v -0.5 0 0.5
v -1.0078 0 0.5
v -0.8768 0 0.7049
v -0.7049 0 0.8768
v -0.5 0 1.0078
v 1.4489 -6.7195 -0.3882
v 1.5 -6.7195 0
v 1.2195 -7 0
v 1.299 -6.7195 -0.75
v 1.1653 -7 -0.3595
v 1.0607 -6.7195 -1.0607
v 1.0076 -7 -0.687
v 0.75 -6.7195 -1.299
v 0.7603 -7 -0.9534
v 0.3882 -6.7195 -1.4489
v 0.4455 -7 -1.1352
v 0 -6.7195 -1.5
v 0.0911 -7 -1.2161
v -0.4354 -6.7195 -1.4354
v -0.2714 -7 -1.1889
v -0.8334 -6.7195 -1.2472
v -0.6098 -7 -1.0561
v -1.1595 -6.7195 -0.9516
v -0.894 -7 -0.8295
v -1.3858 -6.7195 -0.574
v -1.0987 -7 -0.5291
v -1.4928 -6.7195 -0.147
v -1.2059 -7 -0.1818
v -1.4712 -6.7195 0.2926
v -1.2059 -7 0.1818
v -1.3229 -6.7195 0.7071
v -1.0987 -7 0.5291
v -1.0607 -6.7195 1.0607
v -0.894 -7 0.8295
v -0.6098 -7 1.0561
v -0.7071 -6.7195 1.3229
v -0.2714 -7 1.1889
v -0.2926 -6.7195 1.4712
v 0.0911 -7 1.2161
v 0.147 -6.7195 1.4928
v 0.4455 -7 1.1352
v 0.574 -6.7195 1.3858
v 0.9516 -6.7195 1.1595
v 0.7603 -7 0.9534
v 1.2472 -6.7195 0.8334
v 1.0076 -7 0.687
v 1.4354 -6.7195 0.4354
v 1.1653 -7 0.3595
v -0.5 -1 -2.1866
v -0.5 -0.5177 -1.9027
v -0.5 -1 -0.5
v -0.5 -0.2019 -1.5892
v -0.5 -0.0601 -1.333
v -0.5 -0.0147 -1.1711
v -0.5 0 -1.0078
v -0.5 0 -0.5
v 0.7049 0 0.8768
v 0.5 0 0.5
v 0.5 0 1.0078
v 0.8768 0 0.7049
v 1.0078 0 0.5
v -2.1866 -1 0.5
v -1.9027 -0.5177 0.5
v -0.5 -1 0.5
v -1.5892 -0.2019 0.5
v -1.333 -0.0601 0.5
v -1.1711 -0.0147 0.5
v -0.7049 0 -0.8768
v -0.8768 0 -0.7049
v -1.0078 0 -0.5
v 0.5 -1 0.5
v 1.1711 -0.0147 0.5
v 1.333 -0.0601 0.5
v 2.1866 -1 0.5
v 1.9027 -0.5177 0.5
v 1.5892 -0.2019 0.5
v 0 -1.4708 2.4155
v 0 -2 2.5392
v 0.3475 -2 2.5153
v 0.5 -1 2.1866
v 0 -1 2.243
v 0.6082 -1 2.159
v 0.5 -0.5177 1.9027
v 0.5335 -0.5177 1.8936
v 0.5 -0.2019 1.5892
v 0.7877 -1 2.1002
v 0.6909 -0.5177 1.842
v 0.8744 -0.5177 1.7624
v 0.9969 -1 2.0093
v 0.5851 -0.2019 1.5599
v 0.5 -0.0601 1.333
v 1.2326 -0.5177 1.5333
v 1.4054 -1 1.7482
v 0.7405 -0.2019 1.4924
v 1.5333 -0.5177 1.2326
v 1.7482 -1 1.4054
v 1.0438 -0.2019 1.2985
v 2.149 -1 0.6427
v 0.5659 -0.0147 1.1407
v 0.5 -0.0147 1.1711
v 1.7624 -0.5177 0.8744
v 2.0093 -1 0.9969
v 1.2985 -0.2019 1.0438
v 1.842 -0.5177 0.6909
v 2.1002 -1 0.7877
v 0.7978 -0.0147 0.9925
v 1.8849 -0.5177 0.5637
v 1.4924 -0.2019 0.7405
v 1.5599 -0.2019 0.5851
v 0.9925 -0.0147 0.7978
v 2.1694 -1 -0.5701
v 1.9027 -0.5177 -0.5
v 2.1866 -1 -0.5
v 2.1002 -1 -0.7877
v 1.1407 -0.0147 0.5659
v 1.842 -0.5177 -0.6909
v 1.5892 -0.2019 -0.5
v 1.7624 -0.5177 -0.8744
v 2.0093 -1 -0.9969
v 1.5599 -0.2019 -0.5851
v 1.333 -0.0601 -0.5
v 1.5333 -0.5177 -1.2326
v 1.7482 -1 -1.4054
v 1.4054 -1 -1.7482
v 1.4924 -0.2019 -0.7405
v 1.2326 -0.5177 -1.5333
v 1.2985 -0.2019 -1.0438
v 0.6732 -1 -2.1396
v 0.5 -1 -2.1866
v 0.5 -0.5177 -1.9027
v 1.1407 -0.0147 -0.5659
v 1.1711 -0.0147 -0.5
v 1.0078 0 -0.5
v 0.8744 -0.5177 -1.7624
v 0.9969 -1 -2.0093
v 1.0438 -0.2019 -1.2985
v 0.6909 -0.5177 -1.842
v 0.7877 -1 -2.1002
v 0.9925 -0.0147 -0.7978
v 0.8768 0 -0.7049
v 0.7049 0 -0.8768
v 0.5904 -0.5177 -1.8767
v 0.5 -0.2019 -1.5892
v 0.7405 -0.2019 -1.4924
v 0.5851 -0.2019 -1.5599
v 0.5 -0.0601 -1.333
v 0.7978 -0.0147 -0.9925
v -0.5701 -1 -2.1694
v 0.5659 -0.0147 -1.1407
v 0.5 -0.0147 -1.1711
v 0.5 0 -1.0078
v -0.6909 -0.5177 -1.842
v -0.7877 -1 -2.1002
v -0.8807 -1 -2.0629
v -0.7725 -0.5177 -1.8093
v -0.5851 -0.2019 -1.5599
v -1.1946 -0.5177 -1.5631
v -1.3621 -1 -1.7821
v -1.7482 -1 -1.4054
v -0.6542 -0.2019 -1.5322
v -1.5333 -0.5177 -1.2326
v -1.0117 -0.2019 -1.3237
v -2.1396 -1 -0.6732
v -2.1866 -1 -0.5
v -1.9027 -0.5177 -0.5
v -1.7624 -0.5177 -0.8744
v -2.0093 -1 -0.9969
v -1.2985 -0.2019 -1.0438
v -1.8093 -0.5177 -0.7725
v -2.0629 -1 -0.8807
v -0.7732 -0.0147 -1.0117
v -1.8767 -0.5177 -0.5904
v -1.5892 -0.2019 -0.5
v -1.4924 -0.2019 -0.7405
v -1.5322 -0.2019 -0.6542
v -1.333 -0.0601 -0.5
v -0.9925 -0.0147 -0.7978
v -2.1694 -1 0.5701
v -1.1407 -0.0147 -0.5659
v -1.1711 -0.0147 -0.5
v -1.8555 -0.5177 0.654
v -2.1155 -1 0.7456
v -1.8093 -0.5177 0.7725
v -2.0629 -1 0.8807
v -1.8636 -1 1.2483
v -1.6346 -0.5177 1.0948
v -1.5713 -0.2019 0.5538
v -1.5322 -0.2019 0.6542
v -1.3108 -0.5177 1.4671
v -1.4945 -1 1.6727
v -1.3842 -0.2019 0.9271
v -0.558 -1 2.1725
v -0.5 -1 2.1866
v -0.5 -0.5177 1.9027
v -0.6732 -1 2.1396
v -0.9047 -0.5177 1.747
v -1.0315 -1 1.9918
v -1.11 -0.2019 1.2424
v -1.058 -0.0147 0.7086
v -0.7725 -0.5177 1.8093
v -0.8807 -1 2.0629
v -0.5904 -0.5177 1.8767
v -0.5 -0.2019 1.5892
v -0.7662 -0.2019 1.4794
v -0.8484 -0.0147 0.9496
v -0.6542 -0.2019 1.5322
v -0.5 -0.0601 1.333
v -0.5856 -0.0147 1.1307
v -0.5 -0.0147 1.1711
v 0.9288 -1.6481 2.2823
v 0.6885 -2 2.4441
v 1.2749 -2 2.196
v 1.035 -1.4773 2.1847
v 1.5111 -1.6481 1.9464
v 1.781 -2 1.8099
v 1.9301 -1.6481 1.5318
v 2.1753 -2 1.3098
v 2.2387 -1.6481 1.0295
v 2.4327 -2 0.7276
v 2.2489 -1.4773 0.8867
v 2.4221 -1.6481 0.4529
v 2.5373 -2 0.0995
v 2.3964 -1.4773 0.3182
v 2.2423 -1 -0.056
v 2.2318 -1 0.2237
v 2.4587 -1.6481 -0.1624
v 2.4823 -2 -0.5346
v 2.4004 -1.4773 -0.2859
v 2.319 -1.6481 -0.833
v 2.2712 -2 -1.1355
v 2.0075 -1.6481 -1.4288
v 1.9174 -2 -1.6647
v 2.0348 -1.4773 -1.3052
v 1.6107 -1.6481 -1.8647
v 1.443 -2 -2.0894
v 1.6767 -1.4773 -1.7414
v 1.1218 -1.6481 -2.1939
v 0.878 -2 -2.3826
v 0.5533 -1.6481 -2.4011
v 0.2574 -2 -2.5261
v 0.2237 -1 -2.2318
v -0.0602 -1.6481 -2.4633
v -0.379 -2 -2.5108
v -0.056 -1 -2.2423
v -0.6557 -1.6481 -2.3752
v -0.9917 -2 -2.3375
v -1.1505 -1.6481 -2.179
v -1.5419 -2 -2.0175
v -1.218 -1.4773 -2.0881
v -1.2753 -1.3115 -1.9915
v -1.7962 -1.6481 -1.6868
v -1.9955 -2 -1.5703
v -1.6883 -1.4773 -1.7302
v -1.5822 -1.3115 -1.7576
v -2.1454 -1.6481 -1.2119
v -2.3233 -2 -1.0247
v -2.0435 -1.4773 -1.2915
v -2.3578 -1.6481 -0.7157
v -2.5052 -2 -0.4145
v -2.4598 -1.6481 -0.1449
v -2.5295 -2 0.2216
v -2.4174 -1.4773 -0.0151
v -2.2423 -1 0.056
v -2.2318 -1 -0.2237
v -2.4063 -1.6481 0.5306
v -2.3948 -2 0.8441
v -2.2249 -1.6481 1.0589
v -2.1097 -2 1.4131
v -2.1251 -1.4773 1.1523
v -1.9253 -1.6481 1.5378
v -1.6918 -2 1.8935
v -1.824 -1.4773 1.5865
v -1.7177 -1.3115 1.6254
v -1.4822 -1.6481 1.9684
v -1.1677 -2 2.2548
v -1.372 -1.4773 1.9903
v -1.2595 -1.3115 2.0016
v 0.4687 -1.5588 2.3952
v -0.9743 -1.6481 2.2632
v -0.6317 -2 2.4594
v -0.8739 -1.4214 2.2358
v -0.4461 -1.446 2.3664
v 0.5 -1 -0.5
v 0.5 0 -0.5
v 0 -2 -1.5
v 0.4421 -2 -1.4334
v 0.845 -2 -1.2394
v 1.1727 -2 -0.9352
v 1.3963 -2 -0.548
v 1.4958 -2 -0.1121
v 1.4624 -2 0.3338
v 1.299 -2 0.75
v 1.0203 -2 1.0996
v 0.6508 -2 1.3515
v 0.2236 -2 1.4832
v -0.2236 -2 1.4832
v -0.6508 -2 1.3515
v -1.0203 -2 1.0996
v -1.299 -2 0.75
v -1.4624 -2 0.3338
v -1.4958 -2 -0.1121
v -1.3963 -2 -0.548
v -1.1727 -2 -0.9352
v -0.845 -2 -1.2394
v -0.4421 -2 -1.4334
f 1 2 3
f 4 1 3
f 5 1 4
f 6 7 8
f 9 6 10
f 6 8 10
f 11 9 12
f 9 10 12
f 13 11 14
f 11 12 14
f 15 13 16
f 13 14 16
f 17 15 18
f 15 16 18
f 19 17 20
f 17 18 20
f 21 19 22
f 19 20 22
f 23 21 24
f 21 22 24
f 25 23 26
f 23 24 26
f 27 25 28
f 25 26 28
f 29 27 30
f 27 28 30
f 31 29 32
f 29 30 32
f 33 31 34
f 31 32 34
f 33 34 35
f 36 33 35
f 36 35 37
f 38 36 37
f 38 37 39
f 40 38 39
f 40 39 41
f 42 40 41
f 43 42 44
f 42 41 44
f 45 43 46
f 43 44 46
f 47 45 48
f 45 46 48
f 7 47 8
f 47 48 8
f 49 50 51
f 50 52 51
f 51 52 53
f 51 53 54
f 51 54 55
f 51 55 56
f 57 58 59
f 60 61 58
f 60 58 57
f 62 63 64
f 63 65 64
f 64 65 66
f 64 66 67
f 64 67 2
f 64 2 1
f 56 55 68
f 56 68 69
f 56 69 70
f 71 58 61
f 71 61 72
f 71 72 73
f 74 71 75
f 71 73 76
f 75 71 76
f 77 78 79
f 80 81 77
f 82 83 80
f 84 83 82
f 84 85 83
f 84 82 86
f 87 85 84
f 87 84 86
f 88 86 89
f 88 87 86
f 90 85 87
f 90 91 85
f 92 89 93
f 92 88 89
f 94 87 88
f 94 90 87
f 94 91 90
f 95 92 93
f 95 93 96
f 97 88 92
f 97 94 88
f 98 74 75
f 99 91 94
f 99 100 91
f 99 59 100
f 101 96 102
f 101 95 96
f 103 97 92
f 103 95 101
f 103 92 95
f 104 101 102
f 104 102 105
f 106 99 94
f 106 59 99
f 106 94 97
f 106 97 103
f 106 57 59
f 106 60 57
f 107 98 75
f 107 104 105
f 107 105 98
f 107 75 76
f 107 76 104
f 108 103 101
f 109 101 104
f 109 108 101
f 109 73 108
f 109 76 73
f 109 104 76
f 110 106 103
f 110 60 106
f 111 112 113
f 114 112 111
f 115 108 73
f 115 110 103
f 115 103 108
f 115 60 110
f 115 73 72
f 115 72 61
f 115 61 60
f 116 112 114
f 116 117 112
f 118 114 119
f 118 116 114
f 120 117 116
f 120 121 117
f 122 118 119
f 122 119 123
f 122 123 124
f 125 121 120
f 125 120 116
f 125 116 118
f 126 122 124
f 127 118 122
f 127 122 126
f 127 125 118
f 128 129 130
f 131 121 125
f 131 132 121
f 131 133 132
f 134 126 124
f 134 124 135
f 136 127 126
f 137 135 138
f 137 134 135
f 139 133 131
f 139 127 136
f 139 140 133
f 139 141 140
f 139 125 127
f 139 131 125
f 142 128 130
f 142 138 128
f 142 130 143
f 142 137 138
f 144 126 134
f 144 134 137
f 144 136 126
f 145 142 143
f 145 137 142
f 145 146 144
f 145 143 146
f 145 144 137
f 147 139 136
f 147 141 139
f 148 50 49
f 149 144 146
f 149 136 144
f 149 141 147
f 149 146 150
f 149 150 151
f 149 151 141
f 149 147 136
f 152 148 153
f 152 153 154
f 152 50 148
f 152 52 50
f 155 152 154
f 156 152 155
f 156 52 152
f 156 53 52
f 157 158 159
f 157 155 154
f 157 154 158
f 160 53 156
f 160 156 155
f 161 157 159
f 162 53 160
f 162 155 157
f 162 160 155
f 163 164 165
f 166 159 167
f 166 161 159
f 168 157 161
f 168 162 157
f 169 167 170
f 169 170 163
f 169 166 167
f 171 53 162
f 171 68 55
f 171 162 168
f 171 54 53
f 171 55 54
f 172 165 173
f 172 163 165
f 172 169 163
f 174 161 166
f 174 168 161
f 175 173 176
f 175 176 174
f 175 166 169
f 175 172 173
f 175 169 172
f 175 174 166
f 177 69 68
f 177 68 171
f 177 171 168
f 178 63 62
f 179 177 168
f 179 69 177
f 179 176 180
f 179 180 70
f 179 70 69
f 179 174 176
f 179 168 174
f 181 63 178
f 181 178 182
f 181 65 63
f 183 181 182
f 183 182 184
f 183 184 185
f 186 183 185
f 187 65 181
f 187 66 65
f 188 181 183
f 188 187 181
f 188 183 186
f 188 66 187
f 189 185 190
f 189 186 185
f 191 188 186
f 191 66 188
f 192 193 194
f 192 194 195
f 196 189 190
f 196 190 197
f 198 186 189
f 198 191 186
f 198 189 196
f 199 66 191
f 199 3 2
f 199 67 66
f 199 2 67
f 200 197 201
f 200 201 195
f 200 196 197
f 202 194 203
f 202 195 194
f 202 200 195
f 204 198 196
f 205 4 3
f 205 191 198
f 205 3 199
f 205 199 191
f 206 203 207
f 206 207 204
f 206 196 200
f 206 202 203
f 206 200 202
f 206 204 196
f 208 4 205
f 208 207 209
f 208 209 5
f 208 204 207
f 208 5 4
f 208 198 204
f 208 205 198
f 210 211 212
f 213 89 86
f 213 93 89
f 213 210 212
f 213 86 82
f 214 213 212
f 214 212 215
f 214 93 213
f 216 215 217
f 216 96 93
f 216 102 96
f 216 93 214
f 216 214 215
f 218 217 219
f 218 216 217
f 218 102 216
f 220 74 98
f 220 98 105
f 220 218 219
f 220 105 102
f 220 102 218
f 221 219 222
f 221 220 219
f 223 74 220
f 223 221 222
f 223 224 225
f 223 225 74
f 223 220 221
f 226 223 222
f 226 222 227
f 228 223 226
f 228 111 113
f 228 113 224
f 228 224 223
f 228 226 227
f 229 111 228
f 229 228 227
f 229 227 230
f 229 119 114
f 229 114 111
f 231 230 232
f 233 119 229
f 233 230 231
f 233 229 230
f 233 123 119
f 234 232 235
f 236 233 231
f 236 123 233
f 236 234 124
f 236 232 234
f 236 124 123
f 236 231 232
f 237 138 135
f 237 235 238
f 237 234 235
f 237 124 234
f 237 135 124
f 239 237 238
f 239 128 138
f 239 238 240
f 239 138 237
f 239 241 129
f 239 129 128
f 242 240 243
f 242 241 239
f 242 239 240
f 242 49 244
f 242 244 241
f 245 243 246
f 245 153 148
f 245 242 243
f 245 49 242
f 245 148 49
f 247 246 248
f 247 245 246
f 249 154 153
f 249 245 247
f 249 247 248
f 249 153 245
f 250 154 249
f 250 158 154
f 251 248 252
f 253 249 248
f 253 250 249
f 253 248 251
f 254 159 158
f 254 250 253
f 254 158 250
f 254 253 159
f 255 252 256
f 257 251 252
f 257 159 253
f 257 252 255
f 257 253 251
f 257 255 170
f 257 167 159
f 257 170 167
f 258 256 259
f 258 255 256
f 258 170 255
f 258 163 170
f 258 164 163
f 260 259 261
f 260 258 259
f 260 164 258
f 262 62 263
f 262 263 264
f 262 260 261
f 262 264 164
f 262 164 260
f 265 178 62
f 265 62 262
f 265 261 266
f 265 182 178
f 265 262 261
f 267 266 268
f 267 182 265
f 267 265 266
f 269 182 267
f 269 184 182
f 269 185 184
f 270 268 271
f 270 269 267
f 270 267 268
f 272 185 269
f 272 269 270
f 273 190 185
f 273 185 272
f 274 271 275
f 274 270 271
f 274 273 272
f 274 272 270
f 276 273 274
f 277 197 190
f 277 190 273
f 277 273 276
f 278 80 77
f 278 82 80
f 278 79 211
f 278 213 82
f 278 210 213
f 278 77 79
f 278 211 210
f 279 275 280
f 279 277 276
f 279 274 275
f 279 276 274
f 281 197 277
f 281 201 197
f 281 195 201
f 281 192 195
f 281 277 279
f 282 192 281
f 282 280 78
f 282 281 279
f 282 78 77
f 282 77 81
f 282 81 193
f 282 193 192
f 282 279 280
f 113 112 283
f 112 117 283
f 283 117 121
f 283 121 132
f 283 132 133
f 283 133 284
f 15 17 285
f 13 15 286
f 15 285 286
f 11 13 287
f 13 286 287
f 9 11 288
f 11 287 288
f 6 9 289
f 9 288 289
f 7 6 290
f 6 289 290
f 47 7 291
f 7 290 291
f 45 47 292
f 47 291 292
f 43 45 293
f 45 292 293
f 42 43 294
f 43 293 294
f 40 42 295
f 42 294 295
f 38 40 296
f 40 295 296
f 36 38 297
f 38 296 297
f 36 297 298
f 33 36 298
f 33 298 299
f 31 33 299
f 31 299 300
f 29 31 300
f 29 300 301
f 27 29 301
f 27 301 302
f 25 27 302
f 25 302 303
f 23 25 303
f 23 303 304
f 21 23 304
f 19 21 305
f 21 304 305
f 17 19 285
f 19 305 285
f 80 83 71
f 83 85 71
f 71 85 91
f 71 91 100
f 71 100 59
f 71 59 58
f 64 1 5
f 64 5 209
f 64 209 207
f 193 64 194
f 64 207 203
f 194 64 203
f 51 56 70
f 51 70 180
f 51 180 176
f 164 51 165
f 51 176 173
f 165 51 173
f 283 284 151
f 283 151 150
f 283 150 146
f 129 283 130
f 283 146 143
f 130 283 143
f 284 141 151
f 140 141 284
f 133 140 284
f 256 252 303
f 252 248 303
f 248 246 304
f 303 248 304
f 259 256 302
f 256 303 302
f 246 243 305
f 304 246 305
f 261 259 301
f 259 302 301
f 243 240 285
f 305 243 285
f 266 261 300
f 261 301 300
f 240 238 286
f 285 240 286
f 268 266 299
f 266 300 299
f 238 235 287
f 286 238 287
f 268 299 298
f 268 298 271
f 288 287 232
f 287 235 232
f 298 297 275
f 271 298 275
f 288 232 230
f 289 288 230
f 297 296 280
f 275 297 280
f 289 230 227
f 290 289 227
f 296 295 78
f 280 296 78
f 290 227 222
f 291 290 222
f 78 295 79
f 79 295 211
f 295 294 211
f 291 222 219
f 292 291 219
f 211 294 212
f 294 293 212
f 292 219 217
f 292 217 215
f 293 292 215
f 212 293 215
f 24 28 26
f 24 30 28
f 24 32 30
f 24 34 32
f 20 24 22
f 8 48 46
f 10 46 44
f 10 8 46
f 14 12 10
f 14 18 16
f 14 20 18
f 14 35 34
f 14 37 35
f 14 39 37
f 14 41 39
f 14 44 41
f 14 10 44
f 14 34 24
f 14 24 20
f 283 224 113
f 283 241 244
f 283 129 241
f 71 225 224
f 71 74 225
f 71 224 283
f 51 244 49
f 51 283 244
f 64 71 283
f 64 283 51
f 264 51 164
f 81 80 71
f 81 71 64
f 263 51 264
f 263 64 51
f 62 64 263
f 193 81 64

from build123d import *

# Parameters (mm, degrees)
SKETCH1_R           = 2.625
BOSS_EXTRUDE1_DEPTH = 2
SKETCH2_R           = 1.5
BOSS_EXTRUDE2_DEPTH = 5
FILLET1_SIZE        = 3
FILLET1_SIZE_2      = 1.5
SKETCH4_W           = 1
SKETCH4_H           = 1
CUT_EXTRUDE1_DEPTH  = 1


# Read off the part's stored shape, not the designer's step: M3x0.5 Machine Threads Stud1
with BuildPart() as part:
    # Sketch1 → Boss-Extrude1 (new body)
    with BuildSketch(Plane(origin=(0, 0, 0), x_dir=(1, 0, 0), z_dir=(0, 1, 0))):
        with Locations(Location((0, 0, 0), (0, 0, 270))):
            Circle(SKETCH1_R)
    extrude(amount=-BOSS_EXTRUDE1_DEPTH)

    # Sketch2 → Boss-Extrude2 (add)
    with BuildSketch(Plane(origin=(0, -2, 0), x_dir=(-1, 0, 0), z_dir=(0, -1, 0))):
        with Locations(Location((0, 0, 0), (0, 0, 90))):
            Circle(SKETCH2_R)
    extrude(amount=BOSS_EXTRUDE2_DEPTH)

    # M3x0.5 Machine Threads Stud1 outline → M3x0.5 Machine Threads Stud1 (revolve, cut)
    with BuildSketch(Plane.XY):
        Polygon((1.5, -6.7195), (1.2195, -7), (1.5, -7), align=None)
    revolve(axis=Axis((0, 0, 0), (0, 1, 0)), mode=Mode.SUBTRACT)

    # Fillet1
    # an asymmetric fillet: 3, 1.5 mm, written as the material it takes off along each edge
    with BuildSketch(Plane(origin=(0, 0, 0), x_dir=(0, 0, 1), z_dir=(-1, 0, 0))) as fillet1_piece_1:
        with BuildLine():
            Bezier((2.625, -FILLET1_SIZE), (2.625, 0), (2.625 - FILLET1_SIZE_2, 0), weights=[1, 0.707106781, 1])
            Line((2.625 - FILLET1_SIZE_2, 0), (2.625, 0))
            Line((2.625, 0), (2.625, -FILLET1_SIZE))
        make_face()
    revolve(axis=Axis((0, 0, 0), (0, 1, 0)), mode=Mode.SUBTRACT)

    # Sketch4 → Cut-Extrude1 (cut)
    with BuildSketch(Plane(origin=(0, 0, 0), x_dir=(-1, 0, 0), z_dir=(0, 1, 0))):
        with BuildLine():
            Line((-3, 0.5), (-3, -0.5))
            Line((-3, -0.5), (-1.007782219, -0.5))
            ThreePointArc((-1.007782219, -0.5), (-1.125, 0), (-1.007782219, 0.5))
            Line((-1.007782219, 0.5), (-3, 0.5))
        make_face()
        with BuildLine():
            ThreePointArc((-1.007782219, 0.5), (-1.125, 0), (-1.007782219, -0.5))
            Line((-1.007782219, -0.5), (-0.5, -0.5))
            Line((-0.5, -0.5), (-0.5, 0.5))
            Line((-0.5, 0.5), (-1.007782219, 0.5))
        make_face()
        Rectangle(SKETCH4_W, SKETCH4_H)
        with BuildLine():
            Line((0.5, -0.5), (-0.5, -0.5))
            Line((-0.5, -0.5), (-0.5, -1.007782219))
            ThreePointArc((-0.5, -1.007782219), (0, -1.125), (0.5, -1.007782219))
            Line((0.5, -1.007782219), (0.5, -0.5))
        make_face()
        with BuildLine():
            ThreePointArc((0.5, -1.007782219), (0, -1.125), (-0.5, -1.007782219))
            Line((-0.5, -1.007782219), (-0.5, -3))
            Line((-0.5, -3), (0.5, -3))
            Line((0.5, -3), (0.5, -1.007782219))
        make_face()
        with BuildLine():
            Line((0.5, 0.5), (0.5, -0.5))
            Line((0.5, -0.5), (1.007782219, -0.5))
            ThreePointArc((1.007782219, -0.5), (1.09530361, -0.256778118), (1.125, 0))
            ThreePointArc((1.125, 0), (1.09530361, 0.256778118), (1.007782219, 0.5))
            Line((1.007782219, 0.5), (0.5, 0.5))
        make_face()
        with BuildLine():
            ThreePointArc((1.125, 0), (1.09530361, -0.256778118), (1.007782219, -0.5))
            Line((1.007782219, -0.5), (3, -0.5))
            Line((3, -0.5), (3, 0.5))
            Line((3, 0.5), (1.007782219, 0.5))
            ThreePointArc((1.007782219, 0.5), (1.09530361, 0.256778118), (1.125, 0))
        make_face()
        with BuildLine():
            Line((-0.5, 1.007782219), (-0.5, 0.5))
            Line((-0.5, 0.5), (0.5, 0.5))
            Line((0.5, 0.5), (0.5, 1.007782219))
            ThreePointArc((0.5, 1.007782219), (0, 1.125), (-0.5, 1.007782219))
        make_face()
        with BuildLine():
            Line((-0.5, 3), (-0.5, 1.007782219))
            ThreePointArc((-0.5, 1.007782219), (0, 1.125), (0.5, 1.007782219))
            Line((0.5, 1.007782219), (0.5, 3))
            Line((0.5, 3), (-0.5, 3))
        make_face()
    extrude(amount=-CUT_EXTRUDE1_DEPTH, mode=Mode.SUBTRACT)


solid = part.part
